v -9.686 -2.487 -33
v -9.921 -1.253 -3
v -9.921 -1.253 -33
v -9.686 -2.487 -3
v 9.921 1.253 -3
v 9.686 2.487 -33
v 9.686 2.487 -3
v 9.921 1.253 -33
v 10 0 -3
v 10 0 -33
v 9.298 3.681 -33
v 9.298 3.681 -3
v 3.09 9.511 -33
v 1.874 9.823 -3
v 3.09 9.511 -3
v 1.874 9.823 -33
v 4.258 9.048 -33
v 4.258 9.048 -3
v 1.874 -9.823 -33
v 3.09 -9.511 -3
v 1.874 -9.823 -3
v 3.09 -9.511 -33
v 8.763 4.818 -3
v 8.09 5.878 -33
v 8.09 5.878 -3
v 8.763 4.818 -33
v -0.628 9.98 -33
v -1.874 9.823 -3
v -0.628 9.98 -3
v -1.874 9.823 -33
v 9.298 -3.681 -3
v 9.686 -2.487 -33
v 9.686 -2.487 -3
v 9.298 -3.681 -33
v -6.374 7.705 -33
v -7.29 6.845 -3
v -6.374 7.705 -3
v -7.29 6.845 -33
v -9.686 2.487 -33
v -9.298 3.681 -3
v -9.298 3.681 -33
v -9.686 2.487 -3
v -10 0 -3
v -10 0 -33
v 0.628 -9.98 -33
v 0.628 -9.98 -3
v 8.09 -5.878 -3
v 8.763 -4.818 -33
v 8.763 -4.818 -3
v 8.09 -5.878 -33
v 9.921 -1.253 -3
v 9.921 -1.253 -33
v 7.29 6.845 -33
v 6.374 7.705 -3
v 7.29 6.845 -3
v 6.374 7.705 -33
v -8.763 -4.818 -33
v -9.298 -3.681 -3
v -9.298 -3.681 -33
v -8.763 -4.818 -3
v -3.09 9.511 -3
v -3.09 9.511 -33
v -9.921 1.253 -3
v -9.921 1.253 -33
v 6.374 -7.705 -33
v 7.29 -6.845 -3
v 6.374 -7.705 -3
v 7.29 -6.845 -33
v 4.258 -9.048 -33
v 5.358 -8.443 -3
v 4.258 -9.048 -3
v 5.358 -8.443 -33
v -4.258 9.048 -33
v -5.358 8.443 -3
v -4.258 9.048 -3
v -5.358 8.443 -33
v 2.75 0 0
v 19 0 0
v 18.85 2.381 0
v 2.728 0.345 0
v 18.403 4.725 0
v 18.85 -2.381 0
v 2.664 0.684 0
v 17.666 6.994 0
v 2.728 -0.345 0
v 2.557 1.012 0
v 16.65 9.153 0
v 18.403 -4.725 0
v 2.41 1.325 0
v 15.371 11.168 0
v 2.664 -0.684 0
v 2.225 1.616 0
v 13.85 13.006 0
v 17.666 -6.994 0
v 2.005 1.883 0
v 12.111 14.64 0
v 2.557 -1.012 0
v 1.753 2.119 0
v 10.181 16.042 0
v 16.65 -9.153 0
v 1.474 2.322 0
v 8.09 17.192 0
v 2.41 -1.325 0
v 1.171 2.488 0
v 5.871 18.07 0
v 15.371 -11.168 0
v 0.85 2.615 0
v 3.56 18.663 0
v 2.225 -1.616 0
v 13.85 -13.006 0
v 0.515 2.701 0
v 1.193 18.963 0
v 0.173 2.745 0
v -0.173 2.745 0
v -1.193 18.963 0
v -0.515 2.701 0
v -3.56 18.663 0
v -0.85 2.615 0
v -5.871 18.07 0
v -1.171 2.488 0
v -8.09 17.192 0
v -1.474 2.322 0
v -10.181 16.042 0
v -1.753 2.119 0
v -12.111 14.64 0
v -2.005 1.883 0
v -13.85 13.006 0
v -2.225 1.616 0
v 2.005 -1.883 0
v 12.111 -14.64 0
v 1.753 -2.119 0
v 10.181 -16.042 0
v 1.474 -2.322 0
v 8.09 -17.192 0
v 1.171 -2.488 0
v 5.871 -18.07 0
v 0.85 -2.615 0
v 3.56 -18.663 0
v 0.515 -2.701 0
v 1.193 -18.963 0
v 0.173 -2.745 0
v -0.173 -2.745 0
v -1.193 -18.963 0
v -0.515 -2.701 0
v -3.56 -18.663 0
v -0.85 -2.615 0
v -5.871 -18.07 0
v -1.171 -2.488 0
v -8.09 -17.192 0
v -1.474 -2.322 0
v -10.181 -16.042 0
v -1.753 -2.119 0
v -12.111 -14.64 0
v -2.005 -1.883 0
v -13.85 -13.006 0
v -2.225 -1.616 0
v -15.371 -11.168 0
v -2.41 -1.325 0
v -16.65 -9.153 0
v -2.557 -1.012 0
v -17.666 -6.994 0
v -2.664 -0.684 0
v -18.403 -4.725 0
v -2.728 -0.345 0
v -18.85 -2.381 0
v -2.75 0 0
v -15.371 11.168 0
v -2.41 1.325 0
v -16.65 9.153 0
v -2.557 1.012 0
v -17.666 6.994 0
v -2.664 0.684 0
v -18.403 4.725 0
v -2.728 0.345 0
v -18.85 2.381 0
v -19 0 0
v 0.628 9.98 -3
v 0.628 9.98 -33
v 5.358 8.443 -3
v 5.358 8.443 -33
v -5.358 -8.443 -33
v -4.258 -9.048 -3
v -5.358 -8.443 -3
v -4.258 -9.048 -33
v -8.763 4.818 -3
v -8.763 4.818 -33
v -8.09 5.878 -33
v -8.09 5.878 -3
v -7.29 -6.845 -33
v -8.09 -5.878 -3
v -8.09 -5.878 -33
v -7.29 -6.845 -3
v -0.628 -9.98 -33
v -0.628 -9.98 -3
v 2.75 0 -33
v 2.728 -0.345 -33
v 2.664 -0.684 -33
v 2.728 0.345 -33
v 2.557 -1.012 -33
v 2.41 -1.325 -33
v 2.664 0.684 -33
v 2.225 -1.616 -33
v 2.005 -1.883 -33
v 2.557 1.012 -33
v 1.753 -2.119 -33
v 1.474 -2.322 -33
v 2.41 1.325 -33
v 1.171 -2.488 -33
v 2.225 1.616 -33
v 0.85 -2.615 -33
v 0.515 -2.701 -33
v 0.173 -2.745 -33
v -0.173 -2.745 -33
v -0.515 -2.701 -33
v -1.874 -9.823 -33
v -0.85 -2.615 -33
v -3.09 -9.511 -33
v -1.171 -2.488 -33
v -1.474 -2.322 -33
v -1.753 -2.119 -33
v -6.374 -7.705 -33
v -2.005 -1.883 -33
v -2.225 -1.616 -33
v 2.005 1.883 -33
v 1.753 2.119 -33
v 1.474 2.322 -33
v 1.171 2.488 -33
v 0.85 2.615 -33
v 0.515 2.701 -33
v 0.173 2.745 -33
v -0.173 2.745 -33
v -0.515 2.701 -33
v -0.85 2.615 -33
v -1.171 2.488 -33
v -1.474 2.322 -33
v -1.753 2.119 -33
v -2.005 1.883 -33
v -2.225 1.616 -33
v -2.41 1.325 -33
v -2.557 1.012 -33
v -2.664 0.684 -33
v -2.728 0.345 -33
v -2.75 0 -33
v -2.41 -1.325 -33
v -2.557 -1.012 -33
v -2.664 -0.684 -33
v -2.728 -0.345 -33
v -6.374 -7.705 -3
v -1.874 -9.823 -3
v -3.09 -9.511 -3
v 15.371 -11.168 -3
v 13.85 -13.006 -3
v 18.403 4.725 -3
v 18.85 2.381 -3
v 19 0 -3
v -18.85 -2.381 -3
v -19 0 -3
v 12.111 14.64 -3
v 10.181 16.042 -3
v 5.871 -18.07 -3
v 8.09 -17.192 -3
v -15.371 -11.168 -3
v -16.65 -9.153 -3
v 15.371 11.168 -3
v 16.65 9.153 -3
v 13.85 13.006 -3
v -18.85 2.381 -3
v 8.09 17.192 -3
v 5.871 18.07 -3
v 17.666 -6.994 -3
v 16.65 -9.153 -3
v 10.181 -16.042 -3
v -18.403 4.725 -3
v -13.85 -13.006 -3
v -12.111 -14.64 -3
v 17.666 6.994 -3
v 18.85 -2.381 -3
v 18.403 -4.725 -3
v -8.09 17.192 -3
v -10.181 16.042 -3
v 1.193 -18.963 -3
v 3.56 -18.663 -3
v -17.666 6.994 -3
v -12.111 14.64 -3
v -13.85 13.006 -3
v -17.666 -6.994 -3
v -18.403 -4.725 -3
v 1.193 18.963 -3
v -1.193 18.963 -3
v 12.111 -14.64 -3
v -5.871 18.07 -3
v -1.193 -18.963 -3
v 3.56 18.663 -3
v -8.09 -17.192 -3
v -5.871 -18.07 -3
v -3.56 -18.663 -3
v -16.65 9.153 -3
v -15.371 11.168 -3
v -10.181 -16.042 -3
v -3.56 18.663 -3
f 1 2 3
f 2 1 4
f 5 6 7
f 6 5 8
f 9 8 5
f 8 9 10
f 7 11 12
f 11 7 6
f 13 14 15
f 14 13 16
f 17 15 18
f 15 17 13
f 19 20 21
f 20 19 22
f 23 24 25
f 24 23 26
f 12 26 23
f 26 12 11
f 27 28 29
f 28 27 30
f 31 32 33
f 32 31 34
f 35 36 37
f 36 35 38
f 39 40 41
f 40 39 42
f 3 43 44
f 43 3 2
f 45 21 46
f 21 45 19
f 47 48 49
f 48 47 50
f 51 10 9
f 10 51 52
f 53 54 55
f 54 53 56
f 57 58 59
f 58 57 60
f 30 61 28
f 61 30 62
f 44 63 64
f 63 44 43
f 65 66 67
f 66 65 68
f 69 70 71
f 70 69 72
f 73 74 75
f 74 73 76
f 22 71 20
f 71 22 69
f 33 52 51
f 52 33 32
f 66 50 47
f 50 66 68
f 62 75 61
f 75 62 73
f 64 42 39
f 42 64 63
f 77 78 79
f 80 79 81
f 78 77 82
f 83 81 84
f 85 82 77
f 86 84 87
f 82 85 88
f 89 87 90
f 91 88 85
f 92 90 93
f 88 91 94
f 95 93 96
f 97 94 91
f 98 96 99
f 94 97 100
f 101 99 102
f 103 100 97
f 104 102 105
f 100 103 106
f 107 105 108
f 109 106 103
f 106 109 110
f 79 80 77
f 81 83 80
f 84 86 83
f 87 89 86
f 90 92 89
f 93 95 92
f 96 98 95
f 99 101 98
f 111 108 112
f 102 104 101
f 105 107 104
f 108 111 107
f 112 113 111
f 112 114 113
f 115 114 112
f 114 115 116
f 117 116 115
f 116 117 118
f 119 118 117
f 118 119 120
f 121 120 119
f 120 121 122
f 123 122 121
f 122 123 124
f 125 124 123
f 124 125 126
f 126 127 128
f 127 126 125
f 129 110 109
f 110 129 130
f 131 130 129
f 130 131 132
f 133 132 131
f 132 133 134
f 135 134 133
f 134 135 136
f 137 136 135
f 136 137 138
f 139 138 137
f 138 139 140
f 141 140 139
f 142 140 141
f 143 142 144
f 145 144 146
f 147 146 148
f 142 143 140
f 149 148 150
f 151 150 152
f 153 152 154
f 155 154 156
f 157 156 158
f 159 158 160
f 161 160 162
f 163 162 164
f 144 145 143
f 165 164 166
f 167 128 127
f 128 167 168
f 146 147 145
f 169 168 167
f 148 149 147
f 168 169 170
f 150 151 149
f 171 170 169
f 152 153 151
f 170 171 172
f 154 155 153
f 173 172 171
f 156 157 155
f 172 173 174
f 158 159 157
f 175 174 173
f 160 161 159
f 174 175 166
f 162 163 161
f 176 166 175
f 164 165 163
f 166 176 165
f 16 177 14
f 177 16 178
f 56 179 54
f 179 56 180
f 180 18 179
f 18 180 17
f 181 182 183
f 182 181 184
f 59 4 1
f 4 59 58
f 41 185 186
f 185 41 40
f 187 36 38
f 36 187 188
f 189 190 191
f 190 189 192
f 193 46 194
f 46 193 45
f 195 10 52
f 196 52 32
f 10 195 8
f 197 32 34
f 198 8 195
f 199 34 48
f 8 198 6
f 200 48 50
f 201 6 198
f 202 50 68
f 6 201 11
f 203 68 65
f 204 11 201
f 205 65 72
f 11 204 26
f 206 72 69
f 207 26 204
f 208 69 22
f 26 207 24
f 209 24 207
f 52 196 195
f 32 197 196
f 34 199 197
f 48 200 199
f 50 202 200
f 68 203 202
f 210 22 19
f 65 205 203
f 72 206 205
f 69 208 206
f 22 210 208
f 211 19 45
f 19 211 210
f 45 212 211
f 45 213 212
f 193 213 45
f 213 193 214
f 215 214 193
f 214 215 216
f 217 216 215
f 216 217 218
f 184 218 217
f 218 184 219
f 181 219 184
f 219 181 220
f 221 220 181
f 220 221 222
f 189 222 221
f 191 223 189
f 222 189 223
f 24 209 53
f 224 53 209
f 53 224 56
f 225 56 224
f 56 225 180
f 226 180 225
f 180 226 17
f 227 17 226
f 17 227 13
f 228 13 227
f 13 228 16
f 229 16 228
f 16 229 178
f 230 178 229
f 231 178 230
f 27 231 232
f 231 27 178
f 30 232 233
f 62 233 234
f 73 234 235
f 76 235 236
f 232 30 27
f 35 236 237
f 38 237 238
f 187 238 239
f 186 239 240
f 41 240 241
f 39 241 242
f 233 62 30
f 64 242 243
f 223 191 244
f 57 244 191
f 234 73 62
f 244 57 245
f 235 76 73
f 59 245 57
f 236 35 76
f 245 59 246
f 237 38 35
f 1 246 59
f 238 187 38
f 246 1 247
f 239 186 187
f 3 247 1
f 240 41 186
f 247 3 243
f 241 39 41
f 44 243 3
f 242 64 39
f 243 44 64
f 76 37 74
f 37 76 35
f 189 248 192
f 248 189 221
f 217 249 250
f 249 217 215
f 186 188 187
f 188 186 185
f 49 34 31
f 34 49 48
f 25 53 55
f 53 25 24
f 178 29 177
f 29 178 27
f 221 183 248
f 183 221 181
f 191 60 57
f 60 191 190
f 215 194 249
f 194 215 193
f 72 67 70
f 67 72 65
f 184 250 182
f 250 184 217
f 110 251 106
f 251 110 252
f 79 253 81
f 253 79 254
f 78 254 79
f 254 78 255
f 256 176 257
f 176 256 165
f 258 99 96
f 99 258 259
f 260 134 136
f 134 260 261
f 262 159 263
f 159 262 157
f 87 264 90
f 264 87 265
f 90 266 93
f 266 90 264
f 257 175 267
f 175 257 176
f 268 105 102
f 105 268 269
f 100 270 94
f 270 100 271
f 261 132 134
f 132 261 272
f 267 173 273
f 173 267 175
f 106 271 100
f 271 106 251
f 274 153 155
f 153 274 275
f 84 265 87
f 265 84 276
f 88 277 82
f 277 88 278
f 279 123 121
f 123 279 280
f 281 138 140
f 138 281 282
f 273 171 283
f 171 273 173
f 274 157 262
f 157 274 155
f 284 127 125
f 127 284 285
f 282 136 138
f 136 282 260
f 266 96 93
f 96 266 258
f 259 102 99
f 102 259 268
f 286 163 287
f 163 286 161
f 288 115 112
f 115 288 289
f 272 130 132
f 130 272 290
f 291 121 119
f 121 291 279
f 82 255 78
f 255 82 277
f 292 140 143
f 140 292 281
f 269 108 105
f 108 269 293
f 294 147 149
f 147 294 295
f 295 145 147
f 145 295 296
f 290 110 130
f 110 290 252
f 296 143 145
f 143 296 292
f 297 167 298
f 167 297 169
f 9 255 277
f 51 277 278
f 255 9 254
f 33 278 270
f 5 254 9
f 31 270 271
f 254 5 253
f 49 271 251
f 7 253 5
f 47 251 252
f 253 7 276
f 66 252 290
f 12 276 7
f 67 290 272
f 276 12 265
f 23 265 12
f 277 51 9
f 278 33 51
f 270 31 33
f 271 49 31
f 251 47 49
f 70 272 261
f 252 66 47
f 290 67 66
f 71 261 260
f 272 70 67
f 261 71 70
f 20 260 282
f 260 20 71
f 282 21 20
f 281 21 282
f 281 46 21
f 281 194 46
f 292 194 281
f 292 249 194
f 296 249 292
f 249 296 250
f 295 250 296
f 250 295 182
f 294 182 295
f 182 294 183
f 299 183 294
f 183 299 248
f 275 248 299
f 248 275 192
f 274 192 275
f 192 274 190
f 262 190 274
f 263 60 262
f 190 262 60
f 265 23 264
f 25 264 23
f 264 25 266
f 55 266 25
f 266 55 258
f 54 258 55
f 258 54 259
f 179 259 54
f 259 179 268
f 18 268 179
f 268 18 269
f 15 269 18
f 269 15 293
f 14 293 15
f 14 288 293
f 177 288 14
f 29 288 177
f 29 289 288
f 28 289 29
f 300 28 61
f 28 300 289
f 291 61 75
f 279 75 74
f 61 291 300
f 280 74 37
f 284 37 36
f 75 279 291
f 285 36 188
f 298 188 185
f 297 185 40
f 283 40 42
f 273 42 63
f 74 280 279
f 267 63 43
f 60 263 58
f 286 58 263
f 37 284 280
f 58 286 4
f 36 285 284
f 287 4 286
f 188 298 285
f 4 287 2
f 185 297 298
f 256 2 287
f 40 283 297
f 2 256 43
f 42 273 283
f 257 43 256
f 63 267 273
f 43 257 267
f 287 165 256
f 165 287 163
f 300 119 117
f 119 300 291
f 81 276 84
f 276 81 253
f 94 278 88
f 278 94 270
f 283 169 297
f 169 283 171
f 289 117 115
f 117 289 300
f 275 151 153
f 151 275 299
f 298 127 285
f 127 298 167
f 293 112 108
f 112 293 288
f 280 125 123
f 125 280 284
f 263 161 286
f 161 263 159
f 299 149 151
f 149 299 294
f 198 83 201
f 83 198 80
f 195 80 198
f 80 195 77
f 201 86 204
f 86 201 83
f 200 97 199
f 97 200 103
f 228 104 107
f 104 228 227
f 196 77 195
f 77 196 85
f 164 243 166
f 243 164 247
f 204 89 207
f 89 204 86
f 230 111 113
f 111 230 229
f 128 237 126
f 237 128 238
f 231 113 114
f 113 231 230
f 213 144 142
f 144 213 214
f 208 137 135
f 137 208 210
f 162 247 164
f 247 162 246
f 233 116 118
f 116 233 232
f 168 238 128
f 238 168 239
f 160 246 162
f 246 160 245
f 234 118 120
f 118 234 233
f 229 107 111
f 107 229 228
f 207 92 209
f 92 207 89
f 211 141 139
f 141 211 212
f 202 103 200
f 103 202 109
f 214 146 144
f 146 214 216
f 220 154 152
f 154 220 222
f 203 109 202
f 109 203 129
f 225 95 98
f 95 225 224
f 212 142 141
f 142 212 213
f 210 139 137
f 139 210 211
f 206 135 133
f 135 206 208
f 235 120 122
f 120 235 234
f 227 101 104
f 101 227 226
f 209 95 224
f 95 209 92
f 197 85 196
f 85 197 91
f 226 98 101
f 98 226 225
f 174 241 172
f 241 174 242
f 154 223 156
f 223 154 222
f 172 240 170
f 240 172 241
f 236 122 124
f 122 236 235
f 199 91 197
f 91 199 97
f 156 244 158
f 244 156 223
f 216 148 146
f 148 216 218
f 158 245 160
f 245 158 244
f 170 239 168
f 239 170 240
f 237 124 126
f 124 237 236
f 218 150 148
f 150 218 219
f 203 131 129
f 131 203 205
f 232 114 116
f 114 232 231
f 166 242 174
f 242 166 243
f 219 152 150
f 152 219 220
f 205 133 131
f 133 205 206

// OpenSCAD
$fn = 50;


difference() {
	union() {
		translate(v = [0, 0, -33.0000000000]) {
			cylinder(h = 33, r = 10.0000000000);
		}
		translate(v = [0, 0, -3.0000000000]) {
			cylinder(h = 3, r = 19.0000000000);
		}
	}
	union() {
		#translate(v = [0, 0, -33]) {
			cylinder(h = 33, r = 2.7500000000);
		}
	}
}
